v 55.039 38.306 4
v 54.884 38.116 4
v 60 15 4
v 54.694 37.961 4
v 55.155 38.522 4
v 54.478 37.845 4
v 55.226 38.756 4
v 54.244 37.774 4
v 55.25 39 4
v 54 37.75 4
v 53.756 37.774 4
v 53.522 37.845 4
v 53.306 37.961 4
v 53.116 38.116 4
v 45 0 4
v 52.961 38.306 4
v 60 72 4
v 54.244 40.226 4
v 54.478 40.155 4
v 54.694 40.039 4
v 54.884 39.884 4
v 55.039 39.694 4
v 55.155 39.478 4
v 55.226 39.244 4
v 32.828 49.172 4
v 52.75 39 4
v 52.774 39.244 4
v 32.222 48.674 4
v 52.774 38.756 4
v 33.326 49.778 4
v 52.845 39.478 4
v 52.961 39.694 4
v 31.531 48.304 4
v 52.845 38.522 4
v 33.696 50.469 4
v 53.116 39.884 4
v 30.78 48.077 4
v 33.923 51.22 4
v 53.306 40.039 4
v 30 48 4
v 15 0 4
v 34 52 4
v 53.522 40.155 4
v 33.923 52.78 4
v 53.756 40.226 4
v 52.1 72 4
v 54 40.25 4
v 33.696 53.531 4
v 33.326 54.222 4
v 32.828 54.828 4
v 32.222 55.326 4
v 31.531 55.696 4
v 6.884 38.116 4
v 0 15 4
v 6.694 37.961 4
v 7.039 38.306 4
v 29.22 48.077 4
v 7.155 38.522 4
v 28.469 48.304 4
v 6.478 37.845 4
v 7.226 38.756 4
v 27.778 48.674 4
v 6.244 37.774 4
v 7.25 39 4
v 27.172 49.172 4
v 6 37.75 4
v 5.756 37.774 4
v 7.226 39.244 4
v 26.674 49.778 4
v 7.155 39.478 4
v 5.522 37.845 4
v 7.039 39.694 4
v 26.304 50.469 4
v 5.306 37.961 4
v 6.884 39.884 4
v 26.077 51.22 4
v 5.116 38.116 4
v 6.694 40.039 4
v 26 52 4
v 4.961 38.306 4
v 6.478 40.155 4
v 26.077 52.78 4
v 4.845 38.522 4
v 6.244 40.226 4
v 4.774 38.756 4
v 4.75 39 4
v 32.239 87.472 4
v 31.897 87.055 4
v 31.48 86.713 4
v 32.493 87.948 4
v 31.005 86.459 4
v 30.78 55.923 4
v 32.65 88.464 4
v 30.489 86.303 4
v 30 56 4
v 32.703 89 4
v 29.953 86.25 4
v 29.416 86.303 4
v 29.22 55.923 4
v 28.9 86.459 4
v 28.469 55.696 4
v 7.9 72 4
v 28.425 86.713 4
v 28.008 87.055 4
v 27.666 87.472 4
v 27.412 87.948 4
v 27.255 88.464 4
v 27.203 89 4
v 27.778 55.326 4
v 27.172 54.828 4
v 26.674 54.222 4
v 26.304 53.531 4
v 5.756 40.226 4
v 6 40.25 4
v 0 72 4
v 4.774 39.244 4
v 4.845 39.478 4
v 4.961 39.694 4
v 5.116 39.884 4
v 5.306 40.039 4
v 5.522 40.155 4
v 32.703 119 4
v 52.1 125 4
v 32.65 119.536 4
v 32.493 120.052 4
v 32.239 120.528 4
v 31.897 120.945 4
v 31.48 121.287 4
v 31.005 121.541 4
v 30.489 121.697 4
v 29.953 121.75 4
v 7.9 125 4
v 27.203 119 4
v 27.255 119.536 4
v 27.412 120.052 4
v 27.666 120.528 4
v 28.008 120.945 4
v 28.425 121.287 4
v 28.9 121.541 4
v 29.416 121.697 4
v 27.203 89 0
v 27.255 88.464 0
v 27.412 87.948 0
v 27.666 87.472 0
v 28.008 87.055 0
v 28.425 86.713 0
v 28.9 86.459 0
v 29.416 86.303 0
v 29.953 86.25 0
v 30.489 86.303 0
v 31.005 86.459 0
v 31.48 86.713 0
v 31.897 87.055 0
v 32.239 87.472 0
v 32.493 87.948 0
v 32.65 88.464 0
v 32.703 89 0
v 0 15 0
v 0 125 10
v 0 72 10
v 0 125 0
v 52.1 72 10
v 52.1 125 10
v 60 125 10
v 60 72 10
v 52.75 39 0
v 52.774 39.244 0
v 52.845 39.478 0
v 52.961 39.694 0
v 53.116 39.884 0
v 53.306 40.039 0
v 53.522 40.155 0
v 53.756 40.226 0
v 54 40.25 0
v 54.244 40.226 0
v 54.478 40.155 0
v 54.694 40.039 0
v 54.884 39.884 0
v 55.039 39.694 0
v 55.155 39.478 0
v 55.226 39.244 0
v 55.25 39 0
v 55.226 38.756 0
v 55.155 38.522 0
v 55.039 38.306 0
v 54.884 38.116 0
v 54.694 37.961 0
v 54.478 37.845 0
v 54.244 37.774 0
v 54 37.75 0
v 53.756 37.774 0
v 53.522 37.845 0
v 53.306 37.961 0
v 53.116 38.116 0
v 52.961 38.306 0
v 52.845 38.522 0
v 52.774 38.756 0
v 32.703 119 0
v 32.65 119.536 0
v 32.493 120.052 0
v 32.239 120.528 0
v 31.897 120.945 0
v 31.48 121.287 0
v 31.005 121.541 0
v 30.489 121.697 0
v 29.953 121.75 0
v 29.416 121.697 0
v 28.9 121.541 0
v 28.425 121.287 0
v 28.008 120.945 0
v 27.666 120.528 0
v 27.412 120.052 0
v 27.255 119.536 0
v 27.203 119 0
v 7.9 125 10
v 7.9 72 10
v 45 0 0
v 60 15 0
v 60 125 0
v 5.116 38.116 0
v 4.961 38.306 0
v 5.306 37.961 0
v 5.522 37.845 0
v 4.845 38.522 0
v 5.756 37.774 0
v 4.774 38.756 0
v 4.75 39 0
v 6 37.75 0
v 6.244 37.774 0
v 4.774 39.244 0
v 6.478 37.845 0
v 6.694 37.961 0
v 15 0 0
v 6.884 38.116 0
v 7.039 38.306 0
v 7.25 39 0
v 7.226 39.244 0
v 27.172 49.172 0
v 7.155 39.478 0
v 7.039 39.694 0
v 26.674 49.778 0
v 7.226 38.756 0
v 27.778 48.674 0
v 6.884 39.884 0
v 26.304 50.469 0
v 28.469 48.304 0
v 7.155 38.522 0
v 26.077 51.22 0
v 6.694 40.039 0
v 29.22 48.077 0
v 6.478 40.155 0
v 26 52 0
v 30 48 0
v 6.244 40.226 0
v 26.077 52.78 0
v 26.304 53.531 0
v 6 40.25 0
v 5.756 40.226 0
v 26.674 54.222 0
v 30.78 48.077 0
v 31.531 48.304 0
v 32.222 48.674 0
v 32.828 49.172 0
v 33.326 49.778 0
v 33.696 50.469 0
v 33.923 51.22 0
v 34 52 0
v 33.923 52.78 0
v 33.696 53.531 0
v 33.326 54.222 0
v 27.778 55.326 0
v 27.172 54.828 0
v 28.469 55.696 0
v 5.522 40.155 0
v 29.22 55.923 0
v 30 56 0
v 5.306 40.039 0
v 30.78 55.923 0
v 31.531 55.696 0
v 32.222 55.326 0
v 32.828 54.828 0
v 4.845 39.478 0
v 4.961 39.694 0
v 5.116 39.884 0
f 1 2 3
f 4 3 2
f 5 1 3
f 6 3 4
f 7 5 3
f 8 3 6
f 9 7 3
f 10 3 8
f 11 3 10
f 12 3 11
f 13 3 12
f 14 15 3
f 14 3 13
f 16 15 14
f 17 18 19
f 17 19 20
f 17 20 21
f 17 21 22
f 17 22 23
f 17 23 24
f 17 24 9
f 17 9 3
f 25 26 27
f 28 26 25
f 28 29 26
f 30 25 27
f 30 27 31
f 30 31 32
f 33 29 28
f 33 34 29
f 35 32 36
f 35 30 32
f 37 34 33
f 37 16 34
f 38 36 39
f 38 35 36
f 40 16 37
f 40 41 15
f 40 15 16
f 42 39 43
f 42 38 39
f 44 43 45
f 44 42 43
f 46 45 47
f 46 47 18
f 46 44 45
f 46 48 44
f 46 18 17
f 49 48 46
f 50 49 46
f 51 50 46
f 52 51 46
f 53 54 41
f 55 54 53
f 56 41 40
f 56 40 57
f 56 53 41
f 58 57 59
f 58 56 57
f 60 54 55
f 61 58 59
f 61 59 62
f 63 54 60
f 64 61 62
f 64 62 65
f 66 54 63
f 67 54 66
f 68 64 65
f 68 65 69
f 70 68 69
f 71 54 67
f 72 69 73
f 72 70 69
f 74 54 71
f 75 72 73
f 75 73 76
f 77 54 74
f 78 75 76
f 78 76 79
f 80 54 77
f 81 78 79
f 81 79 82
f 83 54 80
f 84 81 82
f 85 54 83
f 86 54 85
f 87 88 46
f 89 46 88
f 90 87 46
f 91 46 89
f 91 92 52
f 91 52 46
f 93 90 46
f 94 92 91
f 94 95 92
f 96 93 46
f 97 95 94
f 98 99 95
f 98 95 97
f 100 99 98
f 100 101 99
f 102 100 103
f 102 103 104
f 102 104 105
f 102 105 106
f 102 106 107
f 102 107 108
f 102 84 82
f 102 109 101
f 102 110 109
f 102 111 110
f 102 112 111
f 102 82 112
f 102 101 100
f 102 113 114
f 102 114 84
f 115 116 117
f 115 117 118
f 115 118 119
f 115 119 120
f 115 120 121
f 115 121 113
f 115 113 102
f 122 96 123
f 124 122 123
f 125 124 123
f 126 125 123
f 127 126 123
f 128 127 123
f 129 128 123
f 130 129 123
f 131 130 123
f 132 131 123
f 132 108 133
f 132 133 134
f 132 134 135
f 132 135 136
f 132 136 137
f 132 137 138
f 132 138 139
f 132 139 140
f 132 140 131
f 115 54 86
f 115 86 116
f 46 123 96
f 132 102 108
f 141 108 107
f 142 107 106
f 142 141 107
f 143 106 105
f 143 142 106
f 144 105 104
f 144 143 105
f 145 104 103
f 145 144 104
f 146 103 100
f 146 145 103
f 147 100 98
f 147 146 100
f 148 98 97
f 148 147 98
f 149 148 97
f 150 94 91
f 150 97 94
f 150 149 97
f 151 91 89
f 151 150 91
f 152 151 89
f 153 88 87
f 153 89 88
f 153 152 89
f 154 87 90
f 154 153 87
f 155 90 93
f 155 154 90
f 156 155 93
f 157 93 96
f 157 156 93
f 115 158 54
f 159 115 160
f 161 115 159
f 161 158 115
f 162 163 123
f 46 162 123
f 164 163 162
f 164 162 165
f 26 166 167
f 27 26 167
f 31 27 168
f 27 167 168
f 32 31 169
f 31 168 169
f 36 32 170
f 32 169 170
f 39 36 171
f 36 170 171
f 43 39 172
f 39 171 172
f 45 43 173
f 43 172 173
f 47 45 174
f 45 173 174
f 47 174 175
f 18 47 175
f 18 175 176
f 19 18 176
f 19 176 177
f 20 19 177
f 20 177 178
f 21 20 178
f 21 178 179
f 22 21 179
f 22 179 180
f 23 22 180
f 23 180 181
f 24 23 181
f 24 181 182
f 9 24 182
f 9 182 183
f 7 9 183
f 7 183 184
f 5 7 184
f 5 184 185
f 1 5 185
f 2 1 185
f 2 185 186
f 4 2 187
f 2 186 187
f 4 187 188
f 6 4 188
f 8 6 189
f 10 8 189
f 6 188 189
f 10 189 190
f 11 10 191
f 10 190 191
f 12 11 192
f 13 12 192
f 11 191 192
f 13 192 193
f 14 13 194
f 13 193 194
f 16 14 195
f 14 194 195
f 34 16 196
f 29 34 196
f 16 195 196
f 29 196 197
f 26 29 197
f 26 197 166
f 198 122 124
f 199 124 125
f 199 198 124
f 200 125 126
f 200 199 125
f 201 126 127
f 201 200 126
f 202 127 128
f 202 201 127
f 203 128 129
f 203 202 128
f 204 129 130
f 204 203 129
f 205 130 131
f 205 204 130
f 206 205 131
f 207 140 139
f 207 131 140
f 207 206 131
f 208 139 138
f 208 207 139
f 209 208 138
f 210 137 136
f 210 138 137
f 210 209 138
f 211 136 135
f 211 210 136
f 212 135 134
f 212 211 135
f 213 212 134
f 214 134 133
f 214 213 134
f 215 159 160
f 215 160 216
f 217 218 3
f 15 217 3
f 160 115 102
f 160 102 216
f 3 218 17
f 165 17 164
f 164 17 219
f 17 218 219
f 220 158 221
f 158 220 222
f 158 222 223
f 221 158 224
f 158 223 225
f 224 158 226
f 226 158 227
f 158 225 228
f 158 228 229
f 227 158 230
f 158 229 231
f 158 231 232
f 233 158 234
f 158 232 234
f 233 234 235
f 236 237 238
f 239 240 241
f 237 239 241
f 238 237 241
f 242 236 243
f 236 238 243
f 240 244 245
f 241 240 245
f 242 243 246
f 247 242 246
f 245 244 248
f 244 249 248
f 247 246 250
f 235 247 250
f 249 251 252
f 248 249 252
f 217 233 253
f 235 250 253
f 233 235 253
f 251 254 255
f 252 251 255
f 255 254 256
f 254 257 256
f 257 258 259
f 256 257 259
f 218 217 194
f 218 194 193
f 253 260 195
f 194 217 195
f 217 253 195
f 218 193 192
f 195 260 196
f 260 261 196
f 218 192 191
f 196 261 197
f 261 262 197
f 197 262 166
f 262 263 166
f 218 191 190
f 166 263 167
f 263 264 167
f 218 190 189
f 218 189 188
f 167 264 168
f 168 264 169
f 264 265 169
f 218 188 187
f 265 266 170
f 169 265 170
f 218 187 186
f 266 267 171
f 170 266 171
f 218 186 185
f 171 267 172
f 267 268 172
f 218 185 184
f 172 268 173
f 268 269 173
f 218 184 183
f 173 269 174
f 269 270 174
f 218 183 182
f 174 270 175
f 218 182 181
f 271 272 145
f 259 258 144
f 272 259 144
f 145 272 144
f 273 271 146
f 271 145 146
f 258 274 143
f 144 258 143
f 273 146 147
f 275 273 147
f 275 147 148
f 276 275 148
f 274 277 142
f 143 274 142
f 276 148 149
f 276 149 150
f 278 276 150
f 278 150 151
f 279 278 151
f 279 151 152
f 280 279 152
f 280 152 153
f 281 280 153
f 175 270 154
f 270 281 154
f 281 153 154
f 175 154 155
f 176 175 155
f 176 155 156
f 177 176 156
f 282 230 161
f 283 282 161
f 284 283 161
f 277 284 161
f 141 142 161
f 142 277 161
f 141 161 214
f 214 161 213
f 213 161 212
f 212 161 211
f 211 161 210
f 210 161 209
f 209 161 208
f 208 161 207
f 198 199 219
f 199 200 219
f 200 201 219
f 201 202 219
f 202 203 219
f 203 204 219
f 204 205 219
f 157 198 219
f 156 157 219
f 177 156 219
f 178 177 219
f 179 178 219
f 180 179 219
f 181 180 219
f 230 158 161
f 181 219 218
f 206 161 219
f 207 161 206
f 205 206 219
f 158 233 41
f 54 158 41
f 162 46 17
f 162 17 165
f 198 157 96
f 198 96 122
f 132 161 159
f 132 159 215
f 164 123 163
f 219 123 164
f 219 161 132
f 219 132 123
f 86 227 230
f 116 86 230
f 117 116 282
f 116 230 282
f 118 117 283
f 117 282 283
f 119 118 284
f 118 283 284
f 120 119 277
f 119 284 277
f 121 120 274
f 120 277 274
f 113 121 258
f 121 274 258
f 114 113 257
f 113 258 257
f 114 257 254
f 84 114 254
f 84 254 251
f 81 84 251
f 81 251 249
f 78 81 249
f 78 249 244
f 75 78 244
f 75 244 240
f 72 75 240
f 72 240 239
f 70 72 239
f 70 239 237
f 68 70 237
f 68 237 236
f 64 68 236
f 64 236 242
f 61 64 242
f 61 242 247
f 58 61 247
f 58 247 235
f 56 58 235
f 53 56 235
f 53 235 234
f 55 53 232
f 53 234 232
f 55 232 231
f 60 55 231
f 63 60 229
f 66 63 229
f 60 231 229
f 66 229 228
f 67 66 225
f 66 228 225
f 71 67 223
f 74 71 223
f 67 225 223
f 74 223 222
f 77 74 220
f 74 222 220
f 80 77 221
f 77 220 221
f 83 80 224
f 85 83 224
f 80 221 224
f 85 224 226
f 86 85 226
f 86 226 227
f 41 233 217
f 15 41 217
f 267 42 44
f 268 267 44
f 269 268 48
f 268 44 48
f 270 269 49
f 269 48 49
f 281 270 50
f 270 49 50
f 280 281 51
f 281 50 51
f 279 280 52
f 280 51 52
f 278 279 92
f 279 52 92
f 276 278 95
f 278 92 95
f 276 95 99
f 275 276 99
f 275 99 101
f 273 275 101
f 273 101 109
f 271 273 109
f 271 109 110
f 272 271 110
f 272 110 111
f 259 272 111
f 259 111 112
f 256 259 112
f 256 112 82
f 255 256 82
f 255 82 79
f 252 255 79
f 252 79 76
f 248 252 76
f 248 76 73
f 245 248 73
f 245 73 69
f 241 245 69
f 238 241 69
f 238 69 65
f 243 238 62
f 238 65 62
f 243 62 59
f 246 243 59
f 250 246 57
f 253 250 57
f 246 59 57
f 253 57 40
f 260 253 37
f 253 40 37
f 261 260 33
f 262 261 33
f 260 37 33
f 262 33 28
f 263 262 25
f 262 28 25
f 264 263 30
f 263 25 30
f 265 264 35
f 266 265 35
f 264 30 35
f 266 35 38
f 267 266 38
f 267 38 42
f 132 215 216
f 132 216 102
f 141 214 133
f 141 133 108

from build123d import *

# Parameters (mm, degrees)
ESQUISSE1_W             = 60
ESQUISSE1_H             = 125
BOSS_EXTRU_1_DEPTH      = 10
ESQUISSE2_R             = 4
ENL_V_MAT_EXTRU_1_DEPTH = 11
ESQUISSE4_W             = 6
ESQUISSE4_H             = 72
ENL_V_MAT_EXTRU_2_DEPTH = 61
TROU_TARAUD_M33_D       = 2.5
TROU_TARAUD_M34_D       = 2.5
CHANFREIN1_SIZE         = 15
ESQUISSE15_W            = 44.2
ESQUISSE15_H            = 6
ENL_V_MAT_EXTRU_4_DEPTH = 55
ENL_V_MAT_EXTRU_5_DEPTH = 11


with BuildPart() as part:
    # Esquisse1 → Boss.-Extru.1 (new body)
    with BuildSketch(Plane.XY):
        with Locations((30, 62.5)):
            Rectangle(ESQUISSE1_W, ESQUISSE1_H)
    extrude(amount=BOSS_EXTRU_1_DEPTH)

    # Esquisse2 → Enlèv. mat.-Extru.1 (cut, through all)
    with BuildSketch(Plane.XY.offset(10)):
        with Locations((30, 52)):
            Circle(ESQUISSE2_R)
    extrude(amount=-ENL_V_MAT_EXTRU_1_DEPTH, mode=Mode.SUBTRACT)

    # Esquisse4 → Enlèv. mat.-Extru.2 (cut, through all)
    with BuildSketch(Plane.ZY):
        with Locations((7, 36)):
            Rectangle(ESQUISSE4_W, ESQUISSE4_H)
    extrude(amount=-ENL_V_MAT_EXTRU_2_DEPTH, mode=Mode.SUBTRACT)

    # Trou taraudé M33 (through all)
    with Locations(Plane.XY.offset(4)):
        with Locations((54, 39)):
            Hole(TROU_TARAUD_M33_D / 2)

    # Trou taraudé M34 (through all)
    with Locations(Plane.XY.offset(4)):
        with Locations((6, 39)):
            Hole(TROU_TARAUD_M34_D / 2)

    # Chanfrein1
    chanfrein1_edges = [part.edges().sort_by_distance(p)[0] for p in [
        (60, 0, 2),
        (0, 0, 2),
    ]]
    chamfer(chanfrein1_edges, length=CHANFREIN1_SIZE)

    # Esquisse15 → Enlèv. mat.-Extru.4 (cut)
    with BuildSketch(Plane(origin=(0, 125, 0), x_dir=(1, 0, 0), z_dir=(0, 1, 0))):
        with Locations((30, -7)):
            Rectangle(ESQUISSE15_W, ESQUISSE15_H)
    extrude(amount=-ENL_V_MAT_EXTRU_4_DEPTH, mode=Mode.SUBTRACT)

    # Esquisse16 → Enlèv. mat.-Extru.5 (cut, through all)
    with BuildSketch(Plane(origin=(0, 0, 0), x_dir=(-1, 0, 0), z_dir=(0, 0, -1))):
        with BuildLine():
            Line((-27.202577742, 119), (-27.202577742, 89))
            ThreePointArc((-27.202577742, 89), (-29.952577742, 86.25), (-32.702577742, 89))
            Line((-32.702577742, 89), (-32.702577742, 119))
            ThreePointArc((-32.702577742, 119), (-29.952577742, 121.75), (-27.202577742, 119))
        make_face()
    extrude(amount=-ENL_V_MAT_EXTRU_5_DEPTH, mode=Mode.SUBTRACT)


solid = part.part
